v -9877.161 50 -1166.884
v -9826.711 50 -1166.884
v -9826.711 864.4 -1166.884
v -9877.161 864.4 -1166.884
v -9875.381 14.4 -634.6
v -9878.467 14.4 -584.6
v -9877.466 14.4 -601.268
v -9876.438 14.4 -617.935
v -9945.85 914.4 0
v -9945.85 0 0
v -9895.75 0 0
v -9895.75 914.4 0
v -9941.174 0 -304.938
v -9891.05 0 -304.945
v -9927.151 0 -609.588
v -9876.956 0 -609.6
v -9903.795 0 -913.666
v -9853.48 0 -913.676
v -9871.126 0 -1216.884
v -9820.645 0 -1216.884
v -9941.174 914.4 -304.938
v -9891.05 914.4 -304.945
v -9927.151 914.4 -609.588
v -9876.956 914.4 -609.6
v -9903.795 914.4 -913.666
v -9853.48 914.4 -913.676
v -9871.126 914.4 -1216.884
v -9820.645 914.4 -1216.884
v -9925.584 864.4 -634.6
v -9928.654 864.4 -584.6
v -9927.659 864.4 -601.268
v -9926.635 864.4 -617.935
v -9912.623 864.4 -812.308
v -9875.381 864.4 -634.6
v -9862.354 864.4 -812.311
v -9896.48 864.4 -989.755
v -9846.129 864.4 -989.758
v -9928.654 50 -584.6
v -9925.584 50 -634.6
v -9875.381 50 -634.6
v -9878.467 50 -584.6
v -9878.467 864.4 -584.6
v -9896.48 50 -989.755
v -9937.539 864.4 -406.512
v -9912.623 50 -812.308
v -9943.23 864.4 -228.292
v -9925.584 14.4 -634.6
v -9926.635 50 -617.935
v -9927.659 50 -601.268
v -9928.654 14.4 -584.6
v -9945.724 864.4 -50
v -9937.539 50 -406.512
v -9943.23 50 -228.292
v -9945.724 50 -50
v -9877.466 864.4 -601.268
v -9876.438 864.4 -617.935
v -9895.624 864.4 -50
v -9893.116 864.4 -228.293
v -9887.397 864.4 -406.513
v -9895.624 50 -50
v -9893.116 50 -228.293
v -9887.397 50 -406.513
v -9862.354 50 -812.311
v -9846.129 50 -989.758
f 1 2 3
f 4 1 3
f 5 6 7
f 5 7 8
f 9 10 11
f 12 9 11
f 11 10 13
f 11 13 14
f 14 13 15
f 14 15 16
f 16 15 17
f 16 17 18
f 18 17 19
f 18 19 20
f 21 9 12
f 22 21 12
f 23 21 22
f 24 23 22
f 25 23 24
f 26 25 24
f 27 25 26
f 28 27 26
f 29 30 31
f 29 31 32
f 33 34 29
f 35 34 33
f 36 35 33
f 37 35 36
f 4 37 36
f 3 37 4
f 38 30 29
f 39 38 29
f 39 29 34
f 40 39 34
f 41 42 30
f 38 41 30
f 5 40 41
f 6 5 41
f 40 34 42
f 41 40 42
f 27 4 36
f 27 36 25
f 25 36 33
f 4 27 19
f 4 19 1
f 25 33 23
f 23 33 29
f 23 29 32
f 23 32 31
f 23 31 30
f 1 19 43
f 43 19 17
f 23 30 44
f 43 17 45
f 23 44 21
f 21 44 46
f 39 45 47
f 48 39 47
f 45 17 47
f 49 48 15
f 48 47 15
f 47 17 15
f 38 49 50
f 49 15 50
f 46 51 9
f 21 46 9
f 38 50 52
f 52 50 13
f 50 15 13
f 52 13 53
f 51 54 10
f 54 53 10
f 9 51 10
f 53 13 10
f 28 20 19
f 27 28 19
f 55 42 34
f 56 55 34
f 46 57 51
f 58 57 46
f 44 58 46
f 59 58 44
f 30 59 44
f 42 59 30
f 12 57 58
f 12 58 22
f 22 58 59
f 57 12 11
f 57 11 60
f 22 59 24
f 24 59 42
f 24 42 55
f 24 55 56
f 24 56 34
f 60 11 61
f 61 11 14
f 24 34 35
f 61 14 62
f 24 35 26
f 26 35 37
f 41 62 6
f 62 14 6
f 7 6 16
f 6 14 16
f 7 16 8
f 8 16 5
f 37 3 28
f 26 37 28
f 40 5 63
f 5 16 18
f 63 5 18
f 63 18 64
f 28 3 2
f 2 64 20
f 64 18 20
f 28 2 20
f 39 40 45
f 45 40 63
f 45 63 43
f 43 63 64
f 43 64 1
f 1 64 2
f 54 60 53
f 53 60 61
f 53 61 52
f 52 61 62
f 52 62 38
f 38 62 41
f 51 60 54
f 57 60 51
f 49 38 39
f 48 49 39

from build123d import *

# Parameters (mm, degrees)
BOSS_EXTRUDE1_DEPTH = 914.4
SKETCH2_W           = 1116.884471925
SKETCH2_H           = 814.4
CUT_EXTRUDE1_DEPTH  = 19950.853735504
BOSS_EXTRUDE3_DEPTH = 850


with BuildPart() as part:
    # Sketch1 → Boss-Extrude1 (new body)
    with BuildSketch(Plane(origin=(0, 0, 0), x_dir=(1, 0, 0), z_dir=(0, 1, 0))):
        with BuildLine():
            Line((-9820.644594144, 1216.884471925), (-9871.125792152, 1216.884471925))
            ThreePointArc((-9871.125792152, 1216.884471925), (-9927.151370921, 609.588288366), (-9945.85, 0))
            Line((-9945.85, 0), (-9895.75, 0))
            ThreePointArc((-9895.75, 0), (-9876.955801384, 609.6), (-9820.644594144, 1216.884471925))
        make_face()
    extrude(amount=BOSS_EXTRUDE1_DEPTH)

    # Sketch2 → Cut-Extrude1 (cut, through all)
    with BuildSketch(Plane(origin=(9945.85, 0, 0), x_dir=(0, 0, -1), z_dir=(1, 0, 0))):
        with Locations((608.442235963, 457.2)):
            Rectangle(SKETCH2_W, SKETCH2_H)
    extrude(amount=-CUT_EXTRUDE1_DEPTH, mode=Mode.SUBTRACT)

    # Sketch5 → Boss-Extrude3 (add)
    with BuildSketch(Plane.XZ.offset(-864.4)):
        Polygon((-9925.583865068, -634.6), (-9875.381051003, -634.6), (-9878.46703201, -584.6), (-9928.654242268, -584.6), align=None)
    extrude(amount=BOSS_EXTRUDE3_DEPTH)


solid = part.part
